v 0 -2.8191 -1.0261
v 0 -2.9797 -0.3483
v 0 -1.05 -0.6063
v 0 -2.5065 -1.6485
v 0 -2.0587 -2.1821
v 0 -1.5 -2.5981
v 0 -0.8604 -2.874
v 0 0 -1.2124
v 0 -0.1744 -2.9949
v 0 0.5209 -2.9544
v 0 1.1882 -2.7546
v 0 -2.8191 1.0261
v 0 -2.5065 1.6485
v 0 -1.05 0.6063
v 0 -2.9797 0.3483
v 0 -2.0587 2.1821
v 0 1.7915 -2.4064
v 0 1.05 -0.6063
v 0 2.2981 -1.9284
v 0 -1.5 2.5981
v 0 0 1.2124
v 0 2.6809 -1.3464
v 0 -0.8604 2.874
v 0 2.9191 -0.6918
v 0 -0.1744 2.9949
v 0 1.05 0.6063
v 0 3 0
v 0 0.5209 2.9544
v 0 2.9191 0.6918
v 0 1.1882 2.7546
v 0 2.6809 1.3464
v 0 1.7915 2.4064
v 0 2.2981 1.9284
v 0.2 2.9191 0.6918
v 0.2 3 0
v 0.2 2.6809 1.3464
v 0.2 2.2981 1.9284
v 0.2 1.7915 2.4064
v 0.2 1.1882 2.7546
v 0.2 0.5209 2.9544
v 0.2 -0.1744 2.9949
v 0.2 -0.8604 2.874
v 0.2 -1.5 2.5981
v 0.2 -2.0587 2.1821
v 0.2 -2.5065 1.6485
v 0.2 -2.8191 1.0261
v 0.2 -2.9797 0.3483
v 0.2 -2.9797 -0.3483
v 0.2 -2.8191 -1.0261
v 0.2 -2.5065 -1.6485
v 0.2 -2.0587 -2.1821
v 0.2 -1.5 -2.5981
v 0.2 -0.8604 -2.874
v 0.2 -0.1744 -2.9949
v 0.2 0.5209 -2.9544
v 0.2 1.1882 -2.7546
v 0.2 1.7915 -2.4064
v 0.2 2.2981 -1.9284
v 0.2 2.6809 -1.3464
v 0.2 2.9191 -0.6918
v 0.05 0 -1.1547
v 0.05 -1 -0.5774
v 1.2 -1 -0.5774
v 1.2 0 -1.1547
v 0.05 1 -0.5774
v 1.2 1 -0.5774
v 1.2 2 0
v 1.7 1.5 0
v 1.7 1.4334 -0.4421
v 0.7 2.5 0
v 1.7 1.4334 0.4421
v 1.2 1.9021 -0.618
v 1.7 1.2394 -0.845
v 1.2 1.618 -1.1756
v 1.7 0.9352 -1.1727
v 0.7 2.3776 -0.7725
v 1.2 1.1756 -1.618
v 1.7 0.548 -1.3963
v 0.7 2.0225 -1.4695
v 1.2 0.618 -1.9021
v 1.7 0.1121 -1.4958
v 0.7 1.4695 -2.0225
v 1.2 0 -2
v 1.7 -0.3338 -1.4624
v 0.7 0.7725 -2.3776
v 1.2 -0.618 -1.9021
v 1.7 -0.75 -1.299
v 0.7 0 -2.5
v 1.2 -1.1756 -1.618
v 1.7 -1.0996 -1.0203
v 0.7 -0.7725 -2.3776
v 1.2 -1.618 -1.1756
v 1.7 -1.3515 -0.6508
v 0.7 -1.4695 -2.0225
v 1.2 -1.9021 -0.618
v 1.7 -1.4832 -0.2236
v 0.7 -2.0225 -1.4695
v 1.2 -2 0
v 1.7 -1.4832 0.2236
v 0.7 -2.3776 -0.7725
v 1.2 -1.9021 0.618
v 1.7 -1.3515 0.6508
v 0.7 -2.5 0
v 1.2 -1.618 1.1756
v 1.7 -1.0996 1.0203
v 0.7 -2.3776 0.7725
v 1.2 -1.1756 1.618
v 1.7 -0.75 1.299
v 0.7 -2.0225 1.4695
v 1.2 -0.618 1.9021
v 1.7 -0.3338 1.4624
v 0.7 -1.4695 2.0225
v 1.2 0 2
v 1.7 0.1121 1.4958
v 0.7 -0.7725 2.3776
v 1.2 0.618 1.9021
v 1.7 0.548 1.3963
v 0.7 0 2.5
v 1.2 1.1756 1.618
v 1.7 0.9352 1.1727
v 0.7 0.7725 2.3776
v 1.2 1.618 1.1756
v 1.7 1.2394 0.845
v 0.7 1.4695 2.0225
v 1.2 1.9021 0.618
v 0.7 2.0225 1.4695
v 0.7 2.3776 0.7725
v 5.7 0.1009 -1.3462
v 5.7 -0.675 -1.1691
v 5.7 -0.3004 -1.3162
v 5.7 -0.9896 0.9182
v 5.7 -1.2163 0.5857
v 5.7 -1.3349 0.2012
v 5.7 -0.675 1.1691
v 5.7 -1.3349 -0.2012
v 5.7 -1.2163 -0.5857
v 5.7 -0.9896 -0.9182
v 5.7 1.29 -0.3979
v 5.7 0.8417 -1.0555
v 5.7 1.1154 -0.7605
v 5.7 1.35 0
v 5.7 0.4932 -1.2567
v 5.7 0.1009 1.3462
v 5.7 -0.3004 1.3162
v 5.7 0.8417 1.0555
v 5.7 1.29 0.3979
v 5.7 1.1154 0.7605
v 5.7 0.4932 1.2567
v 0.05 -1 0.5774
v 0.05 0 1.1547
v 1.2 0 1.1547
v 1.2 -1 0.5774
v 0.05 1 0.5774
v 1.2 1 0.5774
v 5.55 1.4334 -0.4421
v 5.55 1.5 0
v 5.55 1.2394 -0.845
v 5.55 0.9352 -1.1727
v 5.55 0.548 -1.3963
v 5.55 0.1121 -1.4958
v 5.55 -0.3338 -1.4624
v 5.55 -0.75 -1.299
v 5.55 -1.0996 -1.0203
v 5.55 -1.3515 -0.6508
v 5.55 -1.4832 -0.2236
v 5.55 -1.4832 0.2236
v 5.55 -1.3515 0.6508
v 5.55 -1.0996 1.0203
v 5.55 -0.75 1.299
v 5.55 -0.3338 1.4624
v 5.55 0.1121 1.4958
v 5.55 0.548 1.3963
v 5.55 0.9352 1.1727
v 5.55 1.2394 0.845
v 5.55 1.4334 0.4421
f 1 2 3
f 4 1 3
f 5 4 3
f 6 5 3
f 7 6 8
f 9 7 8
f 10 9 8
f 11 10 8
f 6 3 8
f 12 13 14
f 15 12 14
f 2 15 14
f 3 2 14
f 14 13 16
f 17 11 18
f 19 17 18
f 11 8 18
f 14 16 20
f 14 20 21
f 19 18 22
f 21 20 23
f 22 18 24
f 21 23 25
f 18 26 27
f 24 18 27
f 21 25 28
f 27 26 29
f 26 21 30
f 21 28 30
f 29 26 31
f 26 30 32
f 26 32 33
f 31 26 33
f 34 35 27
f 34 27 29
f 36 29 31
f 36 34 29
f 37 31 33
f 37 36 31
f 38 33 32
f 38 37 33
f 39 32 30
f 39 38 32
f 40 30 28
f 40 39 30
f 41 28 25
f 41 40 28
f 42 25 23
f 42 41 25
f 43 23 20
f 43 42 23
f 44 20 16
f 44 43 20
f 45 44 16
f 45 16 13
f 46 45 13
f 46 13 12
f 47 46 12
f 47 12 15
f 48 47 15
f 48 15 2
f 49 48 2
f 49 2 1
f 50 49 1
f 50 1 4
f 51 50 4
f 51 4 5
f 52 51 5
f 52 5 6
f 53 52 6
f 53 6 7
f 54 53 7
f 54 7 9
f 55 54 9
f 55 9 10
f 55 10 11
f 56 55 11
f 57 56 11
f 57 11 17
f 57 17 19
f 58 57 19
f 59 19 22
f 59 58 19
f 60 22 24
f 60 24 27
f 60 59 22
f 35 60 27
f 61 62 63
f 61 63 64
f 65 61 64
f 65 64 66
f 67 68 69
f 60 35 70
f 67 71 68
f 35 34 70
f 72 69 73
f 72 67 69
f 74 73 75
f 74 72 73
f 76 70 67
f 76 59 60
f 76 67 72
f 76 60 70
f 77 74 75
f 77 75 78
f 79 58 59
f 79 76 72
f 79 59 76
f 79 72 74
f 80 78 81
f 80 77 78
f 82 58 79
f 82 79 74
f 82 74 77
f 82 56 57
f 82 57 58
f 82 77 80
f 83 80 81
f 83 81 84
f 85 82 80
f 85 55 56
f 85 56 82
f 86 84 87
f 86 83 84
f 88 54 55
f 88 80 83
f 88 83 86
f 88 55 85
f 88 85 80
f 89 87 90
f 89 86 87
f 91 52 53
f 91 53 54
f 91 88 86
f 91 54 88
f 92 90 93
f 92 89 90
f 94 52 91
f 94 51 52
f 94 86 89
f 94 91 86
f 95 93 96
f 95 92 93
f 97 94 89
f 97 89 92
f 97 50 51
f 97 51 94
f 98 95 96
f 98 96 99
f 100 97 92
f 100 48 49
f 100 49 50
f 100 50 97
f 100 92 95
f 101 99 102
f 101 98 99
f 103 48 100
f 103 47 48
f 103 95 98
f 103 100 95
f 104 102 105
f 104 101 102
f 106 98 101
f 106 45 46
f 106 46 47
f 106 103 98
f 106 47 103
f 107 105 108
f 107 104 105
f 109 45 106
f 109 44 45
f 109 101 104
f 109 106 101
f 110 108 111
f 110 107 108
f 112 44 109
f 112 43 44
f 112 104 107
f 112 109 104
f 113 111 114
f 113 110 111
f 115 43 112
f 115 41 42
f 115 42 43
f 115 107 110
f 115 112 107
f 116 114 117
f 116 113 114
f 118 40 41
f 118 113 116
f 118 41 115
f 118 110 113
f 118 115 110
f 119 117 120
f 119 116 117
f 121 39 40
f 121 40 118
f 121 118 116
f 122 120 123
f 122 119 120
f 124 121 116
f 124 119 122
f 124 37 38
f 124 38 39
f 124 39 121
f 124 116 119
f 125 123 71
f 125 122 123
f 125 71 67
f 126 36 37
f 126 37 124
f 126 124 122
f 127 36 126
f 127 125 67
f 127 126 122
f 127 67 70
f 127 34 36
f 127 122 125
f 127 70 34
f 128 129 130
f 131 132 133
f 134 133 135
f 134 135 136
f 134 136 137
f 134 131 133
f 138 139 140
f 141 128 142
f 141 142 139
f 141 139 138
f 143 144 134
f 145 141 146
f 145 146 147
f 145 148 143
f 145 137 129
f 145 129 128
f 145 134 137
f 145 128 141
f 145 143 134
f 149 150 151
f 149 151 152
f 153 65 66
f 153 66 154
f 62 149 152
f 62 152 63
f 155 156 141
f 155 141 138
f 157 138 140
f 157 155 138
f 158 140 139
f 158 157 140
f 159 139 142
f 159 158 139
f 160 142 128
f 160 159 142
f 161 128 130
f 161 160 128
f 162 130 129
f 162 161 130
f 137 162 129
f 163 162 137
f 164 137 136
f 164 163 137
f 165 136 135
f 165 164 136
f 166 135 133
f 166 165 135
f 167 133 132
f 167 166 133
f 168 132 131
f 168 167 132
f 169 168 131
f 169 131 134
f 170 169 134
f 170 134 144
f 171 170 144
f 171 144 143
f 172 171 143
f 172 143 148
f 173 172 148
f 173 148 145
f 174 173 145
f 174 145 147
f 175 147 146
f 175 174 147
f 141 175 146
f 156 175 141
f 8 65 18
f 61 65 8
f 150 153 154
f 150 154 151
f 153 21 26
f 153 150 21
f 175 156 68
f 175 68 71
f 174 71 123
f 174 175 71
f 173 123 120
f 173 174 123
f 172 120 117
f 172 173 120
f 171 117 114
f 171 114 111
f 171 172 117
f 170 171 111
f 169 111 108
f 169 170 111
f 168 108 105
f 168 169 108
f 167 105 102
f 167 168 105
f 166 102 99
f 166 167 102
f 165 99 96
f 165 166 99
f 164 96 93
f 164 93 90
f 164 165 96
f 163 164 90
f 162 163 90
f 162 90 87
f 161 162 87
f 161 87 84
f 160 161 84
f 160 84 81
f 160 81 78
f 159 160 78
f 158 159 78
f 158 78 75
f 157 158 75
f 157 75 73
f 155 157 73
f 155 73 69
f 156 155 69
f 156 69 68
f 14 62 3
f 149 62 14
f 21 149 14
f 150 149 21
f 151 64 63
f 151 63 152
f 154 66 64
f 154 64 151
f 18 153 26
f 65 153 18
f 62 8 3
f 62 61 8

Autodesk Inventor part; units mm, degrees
ref_plane "YZ Plane" through (0, 0, 0) normal (1, 0, 0) x (0, 1, 0)
ref_plane "XZ Plane" through (0, 0, 0) normal (0, 1, 0) x (-1, 0, 0)
ref_plane "XY Plane" through (0, 0, 0) normal (0, 0, 1) x (1, 0, 0)
sketch "スケッチ1" plane through (0, 0, 0) normal (0, 0, 1) x (1, 0, 0)
  line L0 (0, 0) -> (0, 3)
  line L1 (0, 3) -> (0.2, 3)
  line L2 (0.2, 3) -> (1.7, 1.5)
  line L3 (1.7, 1.5) -> (5.7, 1.5)
  line L4 (5.7, 1.5) -> (5.7, 0)
  line L5 (0, 0) -> (5.7, 0)
  dimension "d0" = 45
  dimension "d1" = 3
  dimension "d2" = 1.7
  dimension "d3" = 1.5
  dimension "d4" = 4
revolve "回転1" add sketch "スケッチ1" angle 360 about axis through (0, 0, 0) along (1, 0, 0)
thread "ねじ1" size "M3x0.5" class "6g" standard "ANSI Metric M Profile" length 44.8
sketch "スケッチ2" plane through (0, 0, 0) normal (-1, 0, 0) x (0, 0, 1)
  line L0 (0.5774, 1) -> (1.1547, 0)
  line L1 (1.1547, 0) -> (0.5774, -1)
  line L2 (0.5774, -1) -> (-0.5774, -1)
  line L3 (-0.5774, -1) -> (-1.1547, 0)
  line L4 (-1.1547, 0) -> (-0.5774, 1)
  line L5 (-0.5774, 1) -> (0.5774, 1)
  circle A0 centre (0, 0) radius 1.1547
  point P0 (0, 0)
  point P1 (0, 0)
  dimension "d8" = 2
extrude "押し出し1" cut sketch "スケッチ2" against normal blind 1.2 contours L0 L1 L2 L3 L4 L5
chamfer "面取り1" distance 0.05 angle 45 6 edges at (0, -0.5, -0.866) (0, 0.5, -0.866) (0, 1, 0) (0, 0.5, 0.866) (0, -1, 0) (0, -0.5, 0.866)
chamfer "面取り2" distance 0.15 angle 45 1 edges at (5.7, -1.5, 0)
properties part number "ネジ皿M3L4" material "鋼、高強度、低合金"
